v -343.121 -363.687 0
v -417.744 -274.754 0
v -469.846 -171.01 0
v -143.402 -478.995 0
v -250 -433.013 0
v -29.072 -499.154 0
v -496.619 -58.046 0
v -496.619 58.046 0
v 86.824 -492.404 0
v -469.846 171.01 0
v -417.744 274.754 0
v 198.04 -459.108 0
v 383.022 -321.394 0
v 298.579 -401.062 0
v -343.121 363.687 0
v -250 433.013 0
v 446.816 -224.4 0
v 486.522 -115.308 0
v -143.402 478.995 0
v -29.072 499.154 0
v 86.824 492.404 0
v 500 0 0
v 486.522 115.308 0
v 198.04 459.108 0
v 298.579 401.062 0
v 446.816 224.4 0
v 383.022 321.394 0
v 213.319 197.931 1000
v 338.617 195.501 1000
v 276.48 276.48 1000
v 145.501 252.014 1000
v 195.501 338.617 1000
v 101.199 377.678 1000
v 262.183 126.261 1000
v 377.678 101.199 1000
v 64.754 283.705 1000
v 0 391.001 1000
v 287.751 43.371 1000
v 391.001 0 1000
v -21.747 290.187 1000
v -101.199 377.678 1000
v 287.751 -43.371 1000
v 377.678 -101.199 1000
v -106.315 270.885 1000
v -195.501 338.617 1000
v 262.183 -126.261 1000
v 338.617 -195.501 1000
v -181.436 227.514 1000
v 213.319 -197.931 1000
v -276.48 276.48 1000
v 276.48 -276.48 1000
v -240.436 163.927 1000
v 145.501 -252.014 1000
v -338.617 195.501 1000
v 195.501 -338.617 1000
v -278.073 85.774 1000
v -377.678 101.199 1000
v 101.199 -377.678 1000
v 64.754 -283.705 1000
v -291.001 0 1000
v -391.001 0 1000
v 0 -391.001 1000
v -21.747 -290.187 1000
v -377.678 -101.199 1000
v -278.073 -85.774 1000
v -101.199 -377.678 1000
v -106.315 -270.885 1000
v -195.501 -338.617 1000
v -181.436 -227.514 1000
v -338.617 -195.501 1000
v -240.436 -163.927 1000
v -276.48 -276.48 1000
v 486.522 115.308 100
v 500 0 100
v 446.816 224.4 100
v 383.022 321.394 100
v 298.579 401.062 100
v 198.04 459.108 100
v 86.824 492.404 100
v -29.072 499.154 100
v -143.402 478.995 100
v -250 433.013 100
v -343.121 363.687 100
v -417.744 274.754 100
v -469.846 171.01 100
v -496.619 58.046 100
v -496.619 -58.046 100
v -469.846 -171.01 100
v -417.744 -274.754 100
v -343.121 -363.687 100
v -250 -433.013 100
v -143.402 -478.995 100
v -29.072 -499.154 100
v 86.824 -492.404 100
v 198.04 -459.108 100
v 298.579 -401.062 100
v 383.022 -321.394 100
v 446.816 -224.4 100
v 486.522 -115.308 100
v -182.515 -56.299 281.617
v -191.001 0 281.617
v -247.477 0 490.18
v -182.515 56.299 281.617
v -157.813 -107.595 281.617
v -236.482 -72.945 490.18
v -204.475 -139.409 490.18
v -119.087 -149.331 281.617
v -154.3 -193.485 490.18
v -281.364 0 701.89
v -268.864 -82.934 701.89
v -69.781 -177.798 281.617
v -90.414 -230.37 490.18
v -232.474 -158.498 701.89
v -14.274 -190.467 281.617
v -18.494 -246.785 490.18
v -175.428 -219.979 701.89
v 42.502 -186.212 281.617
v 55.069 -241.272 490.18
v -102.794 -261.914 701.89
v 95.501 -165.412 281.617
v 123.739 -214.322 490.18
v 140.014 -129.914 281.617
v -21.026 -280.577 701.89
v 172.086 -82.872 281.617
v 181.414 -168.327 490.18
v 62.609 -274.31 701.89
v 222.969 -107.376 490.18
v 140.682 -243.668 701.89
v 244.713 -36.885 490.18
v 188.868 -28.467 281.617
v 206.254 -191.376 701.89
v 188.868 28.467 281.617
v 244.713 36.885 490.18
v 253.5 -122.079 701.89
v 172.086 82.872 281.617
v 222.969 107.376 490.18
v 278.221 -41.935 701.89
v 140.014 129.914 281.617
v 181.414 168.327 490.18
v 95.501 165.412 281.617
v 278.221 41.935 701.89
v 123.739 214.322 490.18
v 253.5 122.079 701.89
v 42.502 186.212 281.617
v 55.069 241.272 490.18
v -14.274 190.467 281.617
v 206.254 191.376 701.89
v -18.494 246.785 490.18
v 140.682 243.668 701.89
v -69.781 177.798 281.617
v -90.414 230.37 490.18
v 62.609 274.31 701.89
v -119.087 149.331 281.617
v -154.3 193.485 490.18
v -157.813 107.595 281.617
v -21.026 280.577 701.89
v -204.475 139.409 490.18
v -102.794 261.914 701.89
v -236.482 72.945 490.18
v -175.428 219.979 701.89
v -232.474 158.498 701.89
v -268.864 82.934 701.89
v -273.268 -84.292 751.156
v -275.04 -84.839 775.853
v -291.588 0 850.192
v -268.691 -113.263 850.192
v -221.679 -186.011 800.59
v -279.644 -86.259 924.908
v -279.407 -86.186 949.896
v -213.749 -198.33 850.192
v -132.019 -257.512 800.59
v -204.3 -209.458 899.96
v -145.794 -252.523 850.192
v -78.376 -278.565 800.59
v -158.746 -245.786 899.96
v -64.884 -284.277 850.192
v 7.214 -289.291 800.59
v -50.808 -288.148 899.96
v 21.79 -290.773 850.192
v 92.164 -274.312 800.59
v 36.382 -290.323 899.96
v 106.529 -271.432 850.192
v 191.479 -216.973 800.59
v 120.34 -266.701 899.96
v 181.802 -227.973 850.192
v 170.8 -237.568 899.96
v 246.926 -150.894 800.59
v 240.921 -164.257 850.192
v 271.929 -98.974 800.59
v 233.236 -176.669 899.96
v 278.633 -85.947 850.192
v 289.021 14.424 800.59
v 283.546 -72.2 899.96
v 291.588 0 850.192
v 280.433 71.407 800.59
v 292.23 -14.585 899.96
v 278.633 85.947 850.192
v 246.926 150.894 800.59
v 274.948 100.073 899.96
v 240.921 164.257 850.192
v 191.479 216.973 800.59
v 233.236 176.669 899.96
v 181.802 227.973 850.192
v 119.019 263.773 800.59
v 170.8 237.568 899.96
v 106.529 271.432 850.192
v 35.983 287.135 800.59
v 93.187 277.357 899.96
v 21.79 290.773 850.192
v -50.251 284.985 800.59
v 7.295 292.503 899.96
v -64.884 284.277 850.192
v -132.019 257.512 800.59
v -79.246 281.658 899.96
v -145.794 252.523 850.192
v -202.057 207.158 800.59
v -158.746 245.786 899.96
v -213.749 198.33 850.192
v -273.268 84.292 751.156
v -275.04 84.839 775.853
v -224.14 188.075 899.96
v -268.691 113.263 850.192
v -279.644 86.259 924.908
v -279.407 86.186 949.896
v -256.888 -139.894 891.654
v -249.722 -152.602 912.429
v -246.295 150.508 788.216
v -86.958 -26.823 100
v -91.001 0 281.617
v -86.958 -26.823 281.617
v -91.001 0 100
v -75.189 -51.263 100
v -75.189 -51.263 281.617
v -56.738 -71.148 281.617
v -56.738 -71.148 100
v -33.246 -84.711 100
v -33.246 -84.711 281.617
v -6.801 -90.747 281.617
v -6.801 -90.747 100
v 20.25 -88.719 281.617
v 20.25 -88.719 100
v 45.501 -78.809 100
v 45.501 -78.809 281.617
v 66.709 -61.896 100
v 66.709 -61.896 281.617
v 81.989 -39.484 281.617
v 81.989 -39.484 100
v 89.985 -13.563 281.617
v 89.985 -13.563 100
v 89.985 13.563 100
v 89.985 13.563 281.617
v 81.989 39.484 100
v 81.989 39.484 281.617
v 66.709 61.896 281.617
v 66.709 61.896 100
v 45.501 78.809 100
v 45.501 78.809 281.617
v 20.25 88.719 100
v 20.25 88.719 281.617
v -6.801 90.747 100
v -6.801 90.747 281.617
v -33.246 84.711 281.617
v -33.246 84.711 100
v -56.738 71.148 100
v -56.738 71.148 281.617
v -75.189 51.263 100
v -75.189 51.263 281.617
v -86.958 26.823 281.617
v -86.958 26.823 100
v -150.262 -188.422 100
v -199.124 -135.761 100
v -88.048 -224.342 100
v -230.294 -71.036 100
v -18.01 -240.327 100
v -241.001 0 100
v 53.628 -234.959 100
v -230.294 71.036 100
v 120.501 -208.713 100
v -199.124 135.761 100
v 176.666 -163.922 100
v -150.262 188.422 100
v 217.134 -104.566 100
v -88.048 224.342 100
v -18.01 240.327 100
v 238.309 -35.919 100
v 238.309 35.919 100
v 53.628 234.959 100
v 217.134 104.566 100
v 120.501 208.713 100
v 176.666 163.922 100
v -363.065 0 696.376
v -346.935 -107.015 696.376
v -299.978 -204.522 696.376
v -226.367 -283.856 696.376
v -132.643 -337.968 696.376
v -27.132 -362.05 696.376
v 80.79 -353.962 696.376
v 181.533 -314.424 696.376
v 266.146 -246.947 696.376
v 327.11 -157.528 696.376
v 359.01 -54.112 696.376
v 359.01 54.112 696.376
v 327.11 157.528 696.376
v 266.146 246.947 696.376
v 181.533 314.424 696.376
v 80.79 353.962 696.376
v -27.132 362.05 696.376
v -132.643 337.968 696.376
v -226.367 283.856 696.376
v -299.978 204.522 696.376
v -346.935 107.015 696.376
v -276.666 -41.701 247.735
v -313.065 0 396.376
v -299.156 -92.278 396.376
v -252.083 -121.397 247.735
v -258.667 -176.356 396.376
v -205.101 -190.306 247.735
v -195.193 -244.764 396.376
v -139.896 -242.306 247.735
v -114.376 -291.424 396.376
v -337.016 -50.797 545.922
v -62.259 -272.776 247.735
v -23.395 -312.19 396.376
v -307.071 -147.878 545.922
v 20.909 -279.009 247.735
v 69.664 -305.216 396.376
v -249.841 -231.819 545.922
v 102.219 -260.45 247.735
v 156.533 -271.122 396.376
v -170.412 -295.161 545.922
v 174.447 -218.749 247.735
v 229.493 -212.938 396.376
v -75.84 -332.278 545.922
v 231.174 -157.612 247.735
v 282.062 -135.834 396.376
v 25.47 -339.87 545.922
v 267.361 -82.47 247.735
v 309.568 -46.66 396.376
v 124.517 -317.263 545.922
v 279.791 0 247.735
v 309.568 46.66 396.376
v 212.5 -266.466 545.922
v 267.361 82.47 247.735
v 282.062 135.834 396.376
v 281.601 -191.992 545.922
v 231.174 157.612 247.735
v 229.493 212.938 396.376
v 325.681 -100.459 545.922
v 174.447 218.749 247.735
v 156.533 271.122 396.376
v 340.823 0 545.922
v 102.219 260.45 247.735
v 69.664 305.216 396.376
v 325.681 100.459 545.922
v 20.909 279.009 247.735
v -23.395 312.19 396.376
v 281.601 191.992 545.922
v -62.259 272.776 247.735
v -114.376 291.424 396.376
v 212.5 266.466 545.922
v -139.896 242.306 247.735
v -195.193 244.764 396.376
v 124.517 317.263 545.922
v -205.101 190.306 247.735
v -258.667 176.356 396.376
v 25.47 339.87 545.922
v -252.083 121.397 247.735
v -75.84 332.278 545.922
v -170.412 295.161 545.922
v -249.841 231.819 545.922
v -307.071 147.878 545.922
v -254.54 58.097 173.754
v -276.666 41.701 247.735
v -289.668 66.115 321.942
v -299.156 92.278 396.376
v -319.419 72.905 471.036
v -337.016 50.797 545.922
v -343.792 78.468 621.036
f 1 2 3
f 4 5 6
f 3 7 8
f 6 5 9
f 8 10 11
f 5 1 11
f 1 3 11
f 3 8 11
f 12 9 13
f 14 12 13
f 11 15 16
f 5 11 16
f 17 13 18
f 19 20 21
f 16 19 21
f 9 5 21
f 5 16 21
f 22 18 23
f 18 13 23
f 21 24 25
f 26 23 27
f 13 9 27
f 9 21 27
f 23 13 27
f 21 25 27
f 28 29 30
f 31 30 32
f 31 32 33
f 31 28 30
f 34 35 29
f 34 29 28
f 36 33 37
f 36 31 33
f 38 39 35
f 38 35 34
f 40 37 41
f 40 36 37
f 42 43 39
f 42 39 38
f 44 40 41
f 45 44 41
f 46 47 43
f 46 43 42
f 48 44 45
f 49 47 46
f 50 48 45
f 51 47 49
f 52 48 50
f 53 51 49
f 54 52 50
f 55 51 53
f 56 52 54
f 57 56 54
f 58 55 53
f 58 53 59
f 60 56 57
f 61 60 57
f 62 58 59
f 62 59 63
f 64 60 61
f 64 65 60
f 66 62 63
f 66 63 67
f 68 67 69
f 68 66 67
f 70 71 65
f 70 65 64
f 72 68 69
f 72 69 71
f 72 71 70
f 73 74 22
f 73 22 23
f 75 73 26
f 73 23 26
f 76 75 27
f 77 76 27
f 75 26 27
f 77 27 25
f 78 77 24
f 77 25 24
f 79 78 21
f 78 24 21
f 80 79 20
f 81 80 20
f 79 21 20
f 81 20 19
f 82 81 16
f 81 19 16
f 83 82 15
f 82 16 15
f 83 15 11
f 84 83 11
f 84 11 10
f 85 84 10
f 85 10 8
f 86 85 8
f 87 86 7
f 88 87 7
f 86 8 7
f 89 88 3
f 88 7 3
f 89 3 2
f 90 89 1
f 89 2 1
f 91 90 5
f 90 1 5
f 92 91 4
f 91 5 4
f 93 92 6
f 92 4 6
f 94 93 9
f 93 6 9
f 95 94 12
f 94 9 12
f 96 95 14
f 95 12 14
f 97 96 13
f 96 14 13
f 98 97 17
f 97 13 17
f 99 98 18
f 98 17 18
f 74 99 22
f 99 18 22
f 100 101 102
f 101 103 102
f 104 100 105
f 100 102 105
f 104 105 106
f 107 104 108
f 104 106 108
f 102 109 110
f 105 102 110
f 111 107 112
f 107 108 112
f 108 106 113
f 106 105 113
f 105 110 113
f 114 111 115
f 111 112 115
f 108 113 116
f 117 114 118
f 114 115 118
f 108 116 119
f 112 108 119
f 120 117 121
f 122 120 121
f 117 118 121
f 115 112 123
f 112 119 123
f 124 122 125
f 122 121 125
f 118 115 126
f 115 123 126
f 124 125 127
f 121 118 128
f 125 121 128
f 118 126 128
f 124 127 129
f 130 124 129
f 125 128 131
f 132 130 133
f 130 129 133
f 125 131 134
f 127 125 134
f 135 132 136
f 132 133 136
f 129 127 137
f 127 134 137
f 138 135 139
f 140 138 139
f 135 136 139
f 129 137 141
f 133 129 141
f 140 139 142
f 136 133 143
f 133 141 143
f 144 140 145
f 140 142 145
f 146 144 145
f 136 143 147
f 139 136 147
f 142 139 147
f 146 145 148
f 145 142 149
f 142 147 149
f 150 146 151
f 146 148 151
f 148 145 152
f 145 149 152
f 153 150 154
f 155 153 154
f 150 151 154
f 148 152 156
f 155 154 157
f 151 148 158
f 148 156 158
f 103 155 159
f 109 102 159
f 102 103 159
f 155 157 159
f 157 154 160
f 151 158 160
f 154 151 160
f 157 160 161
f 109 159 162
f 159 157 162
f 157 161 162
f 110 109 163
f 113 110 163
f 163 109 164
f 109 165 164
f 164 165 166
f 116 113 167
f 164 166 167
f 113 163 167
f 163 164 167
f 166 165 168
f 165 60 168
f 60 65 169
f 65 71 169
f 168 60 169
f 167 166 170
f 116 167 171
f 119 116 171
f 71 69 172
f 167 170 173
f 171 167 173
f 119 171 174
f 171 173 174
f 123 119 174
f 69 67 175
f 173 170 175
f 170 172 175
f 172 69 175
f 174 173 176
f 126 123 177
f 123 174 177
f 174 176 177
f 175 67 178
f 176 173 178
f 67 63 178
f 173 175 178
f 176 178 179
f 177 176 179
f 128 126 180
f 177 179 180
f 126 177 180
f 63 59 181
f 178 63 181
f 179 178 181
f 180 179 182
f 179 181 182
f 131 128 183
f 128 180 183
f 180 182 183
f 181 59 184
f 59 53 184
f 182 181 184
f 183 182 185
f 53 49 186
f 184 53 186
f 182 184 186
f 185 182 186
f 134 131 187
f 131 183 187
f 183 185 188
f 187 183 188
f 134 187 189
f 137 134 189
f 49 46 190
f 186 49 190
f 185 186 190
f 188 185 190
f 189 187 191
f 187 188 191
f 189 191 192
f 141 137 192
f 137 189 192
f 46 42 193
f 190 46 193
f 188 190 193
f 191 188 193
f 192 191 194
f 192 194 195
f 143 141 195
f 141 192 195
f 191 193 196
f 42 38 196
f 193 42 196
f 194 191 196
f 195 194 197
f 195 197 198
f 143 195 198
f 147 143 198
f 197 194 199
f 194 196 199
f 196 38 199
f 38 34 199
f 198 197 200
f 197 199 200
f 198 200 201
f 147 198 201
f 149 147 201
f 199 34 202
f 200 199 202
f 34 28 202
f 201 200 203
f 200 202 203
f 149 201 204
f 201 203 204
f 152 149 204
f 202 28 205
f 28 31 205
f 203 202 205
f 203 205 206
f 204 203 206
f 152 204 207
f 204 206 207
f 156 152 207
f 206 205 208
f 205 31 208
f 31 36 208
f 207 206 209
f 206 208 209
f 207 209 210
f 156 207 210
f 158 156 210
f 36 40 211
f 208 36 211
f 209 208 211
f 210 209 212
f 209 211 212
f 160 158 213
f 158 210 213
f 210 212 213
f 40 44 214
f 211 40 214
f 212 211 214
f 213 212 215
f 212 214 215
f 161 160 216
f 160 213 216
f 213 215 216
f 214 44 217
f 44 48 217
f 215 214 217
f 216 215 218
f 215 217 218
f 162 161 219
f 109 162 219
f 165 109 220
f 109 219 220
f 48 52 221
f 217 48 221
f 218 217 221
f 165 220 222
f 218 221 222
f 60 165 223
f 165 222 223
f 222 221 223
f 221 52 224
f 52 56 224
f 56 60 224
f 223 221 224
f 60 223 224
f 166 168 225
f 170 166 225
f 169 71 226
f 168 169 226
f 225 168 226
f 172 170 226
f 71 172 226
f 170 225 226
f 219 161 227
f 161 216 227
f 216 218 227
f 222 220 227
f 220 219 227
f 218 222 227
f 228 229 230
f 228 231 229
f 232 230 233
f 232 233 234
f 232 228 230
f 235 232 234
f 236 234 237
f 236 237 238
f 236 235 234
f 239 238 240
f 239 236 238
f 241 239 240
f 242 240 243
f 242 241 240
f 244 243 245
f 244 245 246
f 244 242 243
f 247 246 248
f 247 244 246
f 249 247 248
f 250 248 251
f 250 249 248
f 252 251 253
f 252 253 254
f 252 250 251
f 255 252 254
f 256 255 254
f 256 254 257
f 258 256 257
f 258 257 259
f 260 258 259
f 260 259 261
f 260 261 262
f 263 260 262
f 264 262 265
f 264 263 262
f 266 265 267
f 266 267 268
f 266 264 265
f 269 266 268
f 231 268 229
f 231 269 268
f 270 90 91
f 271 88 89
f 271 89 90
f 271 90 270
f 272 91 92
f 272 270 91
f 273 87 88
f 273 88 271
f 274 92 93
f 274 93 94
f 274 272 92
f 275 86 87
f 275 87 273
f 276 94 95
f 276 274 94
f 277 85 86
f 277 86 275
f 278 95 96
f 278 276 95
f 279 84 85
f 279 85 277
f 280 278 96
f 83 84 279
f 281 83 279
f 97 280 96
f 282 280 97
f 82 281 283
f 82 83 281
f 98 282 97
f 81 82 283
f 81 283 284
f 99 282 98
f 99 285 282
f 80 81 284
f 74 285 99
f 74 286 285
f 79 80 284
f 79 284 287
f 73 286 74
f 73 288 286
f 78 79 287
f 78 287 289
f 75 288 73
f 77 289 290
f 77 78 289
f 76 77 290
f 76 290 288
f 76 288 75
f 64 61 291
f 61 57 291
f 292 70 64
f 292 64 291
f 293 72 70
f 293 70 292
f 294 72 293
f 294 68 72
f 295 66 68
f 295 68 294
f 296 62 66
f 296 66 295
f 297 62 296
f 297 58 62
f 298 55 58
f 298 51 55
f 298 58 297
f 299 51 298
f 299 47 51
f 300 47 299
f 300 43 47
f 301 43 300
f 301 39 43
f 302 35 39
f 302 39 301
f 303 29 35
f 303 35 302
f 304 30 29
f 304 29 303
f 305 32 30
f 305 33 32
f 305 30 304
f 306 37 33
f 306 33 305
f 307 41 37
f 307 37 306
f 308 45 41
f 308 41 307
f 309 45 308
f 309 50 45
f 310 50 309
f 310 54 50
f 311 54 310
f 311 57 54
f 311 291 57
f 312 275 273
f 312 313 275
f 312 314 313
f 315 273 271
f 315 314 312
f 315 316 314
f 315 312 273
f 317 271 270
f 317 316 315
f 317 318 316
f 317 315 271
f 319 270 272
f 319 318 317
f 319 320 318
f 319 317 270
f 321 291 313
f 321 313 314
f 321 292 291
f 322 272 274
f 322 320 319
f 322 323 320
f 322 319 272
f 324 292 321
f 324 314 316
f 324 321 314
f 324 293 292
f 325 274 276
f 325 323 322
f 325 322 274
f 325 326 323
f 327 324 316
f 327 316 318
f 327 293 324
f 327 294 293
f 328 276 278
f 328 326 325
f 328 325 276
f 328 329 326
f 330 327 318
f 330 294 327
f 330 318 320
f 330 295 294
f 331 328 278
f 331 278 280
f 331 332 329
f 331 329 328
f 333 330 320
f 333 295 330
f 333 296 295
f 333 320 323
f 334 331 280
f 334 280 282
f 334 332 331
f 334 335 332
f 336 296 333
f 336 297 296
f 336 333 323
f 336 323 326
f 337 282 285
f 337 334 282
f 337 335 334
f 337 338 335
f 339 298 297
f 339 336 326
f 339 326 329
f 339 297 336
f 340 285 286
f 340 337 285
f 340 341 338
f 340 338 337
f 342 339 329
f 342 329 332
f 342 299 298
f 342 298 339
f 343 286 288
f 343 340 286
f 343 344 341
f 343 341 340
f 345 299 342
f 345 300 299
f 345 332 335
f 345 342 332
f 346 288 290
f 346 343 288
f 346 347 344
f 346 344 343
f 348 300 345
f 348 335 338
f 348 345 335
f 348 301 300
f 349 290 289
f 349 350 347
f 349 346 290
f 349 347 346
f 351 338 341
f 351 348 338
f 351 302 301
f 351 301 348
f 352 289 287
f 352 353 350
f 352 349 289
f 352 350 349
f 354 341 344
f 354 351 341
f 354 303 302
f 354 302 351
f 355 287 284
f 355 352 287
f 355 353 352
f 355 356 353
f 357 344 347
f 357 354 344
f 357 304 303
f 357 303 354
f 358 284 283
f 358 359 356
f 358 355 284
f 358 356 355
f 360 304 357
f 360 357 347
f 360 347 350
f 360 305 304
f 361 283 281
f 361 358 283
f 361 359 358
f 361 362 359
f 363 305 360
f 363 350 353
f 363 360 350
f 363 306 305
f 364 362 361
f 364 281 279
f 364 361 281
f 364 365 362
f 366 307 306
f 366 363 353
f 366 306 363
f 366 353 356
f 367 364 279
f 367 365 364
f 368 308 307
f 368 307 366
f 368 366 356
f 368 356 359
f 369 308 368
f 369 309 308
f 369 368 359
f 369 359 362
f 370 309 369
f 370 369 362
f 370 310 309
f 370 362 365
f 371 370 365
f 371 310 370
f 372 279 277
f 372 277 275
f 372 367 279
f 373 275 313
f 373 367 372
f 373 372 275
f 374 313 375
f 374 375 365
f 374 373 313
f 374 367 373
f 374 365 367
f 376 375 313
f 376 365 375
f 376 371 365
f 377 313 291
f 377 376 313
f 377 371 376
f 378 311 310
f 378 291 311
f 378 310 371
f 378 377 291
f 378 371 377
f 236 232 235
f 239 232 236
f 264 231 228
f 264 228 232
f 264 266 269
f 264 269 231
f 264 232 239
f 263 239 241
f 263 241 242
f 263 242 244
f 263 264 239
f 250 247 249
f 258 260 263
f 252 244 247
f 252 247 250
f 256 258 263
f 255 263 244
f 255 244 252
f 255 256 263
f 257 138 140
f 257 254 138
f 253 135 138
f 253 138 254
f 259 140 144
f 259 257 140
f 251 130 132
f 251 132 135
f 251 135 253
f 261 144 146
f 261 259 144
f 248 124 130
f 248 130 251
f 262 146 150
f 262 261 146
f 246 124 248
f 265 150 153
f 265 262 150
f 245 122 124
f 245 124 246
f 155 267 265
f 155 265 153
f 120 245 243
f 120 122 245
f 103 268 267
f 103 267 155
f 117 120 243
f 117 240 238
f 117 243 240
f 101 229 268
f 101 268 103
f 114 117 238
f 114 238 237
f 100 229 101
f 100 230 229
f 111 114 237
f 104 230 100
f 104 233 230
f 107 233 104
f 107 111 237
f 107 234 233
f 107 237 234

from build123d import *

# Parameters (mm, degrees)
SKETCH1_R           = 500
BOSS_EXTRUDE1_DEPTH = 100


with BuildPart() as part:
    # Sketch1 → Boss-Extrude1 (new body)
    with BuildSketch(Plane.XY):
        Circle(SKETCH1_R)
    extrude(amount=BOSS_EXTRUDE1_DEPTH)

    # Sketch2 → Revolve2 (revolve)
    with BuildSketch(Plane(origin=(0, 0, 0), x_dir=(1, 0, 0), z_dir=(0, 1, 0)), mode=Mode.PRIVATE) as revolve2_sk:
        with BuildLine():
            Line((191.001086436, -281.617154631), (91.001086436, -281.617154631))
            Line((91.001086436, -281.617154631), (91.001086436, -100))
            Line((91.001086436, -100), (241.001086436, -100))
            add(Edge.make_bspline(
                [(241.001086436, -100), (365.645053483, -541.844977323), (391.001086436, -1000)],
                knots=[0, 0, 0, 1, 1, 1], degree=2))
            Line((391.001086436, -1000), (291.001086436, -1000))
            add(Edge.make_bspline(
                [(191.001086436, -281.617154631), (305.655000956, -631.798317471), (291.001086436, -1000)],
                knots=[0, 0, 0, 1, 1, 1], degree=2))
        make_face()
    revolve(revolve2_sk.sketch.rotate(Axis((0, 0, -166.849755885), (0, 0, 1)), 180), axis=Axis((0, 0, -166.849755885), (0, 0, 1)))


solid = part.part
